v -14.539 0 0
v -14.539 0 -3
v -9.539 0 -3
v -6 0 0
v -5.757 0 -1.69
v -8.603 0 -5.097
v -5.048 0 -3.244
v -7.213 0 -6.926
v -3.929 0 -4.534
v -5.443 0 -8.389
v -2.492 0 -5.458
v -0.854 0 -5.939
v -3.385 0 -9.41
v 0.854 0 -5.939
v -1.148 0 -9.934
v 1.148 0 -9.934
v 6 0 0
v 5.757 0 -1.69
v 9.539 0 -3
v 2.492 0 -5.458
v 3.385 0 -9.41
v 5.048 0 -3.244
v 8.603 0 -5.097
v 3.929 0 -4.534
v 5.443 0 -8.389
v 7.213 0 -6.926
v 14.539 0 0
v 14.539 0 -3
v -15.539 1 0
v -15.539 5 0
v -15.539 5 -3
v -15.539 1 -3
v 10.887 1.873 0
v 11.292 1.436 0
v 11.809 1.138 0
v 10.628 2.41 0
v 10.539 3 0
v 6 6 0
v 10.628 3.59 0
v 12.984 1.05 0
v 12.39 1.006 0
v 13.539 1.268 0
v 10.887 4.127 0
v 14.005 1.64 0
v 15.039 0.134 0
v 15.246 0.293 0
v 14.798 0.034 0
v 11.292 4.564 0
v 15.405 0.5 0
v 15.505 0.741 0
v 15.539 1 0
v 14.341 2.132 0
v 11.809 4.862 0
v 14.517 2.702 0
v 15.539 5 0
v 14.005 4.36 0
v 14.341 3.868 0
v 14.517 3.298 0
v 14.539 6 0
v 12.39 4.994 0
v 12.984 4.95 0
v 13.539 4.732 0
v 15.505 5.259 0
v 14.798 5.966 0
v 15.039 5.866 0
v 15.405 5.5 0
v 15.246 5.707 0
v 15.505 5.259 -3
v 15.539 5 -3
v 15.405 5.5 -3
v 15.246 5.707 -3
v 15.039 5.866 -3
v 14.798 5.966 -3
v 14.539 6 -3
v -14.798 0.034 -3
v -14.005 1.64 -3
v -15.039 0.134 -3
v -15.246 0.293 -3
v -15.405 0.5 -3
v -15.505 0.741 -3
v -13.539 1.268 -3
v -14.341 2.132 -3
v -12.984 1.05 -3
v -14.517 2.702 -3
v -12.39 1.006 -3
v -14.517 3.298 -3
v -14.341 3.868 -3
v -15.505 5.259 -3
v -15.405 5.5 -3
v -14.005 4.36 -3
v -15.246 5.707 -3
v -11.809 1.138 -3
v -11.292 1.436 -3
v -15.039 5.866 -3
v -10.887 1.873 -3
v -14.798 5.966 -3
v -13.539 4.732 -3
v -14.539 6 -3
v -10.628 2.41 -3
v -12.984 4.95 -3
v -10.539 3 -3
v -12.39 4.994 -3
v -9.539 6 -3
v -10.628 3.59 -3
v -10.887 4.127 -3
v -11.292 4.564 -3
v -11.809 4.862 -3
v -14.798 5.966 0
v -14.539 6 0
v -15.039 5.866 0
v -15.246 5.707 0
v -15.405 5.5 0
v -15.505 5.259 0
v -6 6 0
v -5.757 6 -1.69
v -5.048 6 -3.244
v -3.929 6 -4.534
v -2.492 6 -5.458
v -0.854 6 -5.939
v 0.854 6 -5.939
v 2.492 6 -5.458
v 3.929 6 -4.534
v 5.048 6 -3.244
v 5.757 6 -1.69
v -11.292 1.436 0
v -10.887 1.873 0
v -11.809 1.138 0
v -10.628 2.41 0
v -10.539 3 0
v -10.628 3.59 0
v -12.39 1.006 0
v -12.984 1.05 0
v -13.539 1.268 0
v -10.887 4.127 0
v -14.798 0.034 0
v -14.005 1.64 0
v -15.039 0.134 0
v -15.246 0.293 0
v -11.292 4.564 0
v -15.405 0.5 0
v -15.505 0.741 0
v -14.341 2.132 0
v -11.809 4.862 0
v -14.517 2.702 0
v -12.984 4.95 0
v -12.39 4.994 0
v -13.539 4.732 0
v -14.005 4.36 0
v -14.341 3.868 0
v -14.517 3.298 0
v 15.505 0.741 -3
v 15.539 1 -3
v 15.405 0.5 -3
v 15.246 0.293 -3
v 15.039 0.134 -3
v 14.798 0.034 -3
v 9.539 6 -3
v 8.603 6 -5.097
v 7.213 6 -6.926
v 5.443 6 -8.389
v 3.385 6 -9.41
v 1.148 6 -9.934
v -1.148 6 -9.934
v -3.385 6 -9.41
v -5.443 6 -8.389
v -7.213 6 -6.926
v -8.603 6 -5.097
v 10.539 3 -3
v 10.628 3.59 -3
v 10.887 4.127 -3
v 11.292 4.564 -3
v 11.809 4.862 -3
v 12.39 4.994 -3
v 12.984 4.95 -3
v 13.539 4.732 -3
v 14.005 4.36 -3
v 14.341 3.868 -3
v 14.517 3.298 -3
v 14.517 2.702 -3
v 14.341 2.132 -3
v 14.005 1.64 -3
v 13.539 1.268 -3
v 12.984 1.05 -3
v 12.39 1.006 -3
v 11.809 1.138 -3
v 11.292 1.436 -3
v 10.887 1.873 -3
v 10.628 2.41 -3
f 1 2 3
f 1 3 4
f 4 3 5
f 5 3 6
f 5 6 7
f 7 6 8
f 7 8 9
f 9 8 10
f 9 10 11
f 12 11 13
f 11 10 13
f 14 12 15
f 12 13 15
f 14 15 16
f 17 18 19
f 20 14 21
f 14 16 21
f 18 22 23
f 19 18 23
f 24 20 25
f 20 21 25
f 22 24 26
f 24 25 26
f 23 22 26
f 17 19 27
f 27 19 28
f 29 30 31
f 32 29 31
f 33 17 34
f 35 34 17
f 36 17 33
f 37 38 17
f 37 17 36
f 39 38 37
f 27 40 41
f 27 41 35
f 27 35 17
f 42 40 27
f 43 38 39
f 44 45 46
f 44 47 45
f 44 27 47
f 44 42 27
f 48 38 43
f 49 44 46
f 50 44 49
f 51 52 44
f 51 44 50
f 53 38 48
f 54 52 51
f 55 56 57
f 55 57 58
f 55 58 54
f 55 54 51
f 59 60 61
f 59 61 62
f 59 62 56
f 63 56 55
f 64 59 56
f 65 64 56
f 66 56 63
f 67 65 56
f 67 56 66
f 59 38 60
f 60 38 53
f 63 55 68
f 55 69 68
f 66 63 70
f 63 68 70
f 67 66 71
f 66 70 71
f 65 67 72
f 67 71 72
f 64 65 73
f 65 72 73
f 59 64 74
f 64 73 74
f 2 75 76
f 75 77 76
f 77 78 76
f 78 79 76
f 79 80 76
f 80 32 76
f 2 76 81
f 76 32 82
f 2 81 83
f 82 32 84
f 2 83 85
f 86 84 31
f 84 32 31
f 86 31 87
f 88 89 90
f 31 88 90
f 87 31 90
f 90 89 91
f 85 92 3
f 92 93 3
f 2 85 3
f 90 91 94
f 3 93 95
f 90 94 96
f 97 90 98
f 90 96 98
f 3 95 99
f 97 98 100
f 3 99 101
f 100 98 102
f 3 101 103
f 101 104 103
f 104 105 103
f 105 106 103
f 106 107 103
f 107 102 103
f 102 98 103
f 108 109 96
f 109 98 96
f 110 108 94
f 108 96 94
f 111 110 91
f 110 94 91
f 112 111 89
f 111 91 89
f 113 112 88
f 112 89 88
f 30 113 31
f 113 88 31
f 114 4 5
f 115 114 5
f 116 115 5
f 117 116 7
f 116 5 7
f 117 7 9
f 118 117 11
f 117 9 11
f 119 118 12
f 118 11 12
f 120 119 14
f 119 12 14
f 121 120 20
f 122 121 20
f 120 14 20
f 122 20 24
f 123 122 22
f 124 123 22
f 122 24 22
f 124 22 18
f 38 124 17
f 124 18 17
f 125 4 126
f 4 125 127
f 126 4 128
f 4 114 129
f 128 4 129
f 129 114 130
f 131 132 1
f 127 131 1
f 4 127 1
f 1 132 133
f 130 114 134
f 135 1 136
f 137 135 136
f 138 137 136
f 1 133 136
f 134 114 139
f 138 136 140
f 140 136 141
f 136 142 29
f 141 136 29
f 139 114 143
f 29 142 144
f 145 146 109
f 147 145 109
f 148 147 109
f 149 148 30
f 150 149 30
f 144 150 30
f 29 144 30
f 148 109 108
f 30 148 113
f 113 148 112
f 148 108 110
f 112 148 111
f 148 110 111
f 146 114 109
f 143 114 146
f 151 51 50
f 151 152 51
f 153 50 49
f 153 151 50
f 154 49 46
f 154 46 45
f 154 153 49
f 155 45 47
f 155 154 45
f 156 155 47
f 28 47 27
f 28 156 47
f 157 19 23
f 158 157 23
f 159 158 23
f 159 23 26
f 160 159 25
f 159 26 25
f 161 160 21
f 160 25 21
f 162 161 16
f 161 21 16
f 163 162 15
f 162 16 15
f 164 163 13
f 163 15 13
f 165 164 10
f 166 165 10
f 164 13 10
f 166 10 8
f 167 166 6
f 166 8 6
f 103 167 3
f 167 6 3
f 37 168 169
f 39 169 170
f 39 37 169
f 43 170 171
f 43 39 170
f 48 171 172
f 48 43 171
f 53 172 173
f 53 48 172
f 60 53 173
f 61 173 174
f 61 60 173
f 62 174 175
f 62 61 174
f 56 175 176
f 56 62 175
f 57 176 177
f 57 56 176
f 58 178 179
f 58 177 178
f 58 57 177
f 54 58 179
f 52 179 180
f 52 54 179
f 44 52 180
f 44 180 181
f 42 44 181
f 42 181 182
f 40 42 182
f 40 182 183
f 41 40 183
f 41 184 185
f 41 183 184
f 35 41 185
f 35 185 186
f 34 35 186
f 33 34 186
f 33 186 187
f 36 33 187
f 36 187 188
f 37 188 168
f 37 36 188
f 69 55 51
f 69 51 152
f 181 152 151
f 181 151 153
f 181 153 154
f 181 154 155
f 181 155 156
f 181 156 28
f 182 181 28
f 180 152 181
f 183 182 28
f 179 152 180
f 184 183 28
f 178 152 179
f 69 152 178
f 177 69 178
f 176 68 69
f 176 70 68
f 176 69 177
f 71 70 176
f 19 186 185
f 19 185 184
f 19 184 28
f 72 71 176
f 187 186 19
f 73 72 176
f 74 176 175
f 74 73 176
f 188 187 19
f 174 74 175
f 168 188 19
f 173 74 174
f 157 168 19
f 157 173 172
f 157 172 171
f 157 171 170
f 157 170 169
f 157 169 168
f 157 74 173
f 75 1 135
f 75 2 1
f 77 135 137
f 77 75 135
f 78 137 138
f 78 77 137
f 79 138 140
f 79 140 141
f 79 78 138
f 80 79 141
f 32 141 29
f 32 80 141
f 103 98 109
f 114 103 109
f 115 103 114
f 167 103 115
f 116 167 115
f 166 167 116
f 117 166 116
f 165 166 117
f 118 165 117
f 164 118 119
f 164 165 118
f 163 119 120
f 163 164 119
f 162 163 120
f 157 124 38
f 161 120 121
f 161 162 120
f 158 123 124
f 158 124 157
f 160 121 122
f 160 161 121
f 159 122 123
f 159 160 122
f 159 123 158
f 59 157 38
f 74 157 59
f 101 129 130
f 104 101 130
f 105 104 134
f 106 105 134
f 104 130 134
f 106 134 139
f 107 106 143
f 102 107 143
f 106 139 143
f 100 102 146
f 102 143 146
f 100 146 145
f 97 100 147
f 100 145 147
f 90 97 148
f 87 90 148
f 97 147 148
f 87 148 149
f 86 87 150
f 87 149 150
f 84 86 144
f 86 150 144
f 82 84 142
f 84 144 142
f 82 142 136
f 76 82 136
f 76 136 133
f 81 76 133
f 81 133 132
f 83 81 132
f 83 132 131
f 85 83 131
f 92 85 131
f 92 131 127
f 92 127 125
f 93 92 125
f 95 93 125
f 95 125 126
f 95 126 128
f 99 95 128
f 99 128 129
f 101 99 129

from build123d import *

# Parameters (mm, degrees)
BOSS_EXTRUDE1_DEPTH = 6
BOSS_EXTRUDE2_DEPTH = 6
SKETCH4_R           = 2
CUT_EXTRUDE2_DEPTH  = 11
FILLET1_R           = 1


with BuildPart() as part:
    # Sketch1 → Boss-Extrude1 (new body)
    with BuildSketch(Plane(origin=(0, 0, 0), x_dir=(1, 0, 0), z_dir=(0, 1, 0))):
        with BuildLine():
            Line((-10, 0), (-6, 0))
            ThreePointArc((-6, 0), (0, 6), (6, 0))
            Line((6, 0), (10, 0))
            ThreePointArc((10, 0), (0, 10), (-10, 0))
        make_face()
    extrude(amount=BOSS_EXTRUDE1_DEPTH)

    # Sketch3 → Boss-Extrude2 (add)
    with BuildSketch(Plane(origin=(0, 6, 0), x_dir=(1, 0, 0), z_dir=(0, 1, 0))):
        with BuildLine():
            Line((-10, 0), (-15.539392014, 0))
            Line((-15.539392014, 0), (-15.539392014, 3))
            Line((-15.539392014, 3), (-9.539392014, 3))
            ThreePointArc((-9.539392014, 3), (-9.884177258, 1.517576993), (-10, 0))
        make_face()
    boss_extrude2 = extrude(amount=-BOSS_EXTRUDE2_DEPTH)

    # Sketch4 → Cut-Extrude2 (cut, through all)
    with BuildSketch(Plane.XY):
        with Locations((-12.539392014, 3)):
            Circle(SKETCH4_R)
    cut_extrude2 = extrude(amount=-CUT_EXTRUDE2_DEPTH, mode=Mode.SUBTRACT)

    # Mirror2: Boss-Extrude2, Cut-Extrude2 across plane
    add(boss_extrude2.mirror(Plane(origin=(0, 0, 0), x_dir=(0, 0, 1), z_dir=(1, 0, 0))))
    add(cut_extrude2.mirror(Plane(origin=(0, 0, 0), x_dir=(0, 0, 1), z_dir=(1, 0, 0))), mode=Mode.SUBTRACT)

    # Fillet1
    fillet1_edges = [part.edges().sort_by_distance(p)[0] for p in [
        (-15.539392014, 6, -1.5),
        (-15.539392014, 0, -1.5),
        (15.539392014, 6, -1.5),
        (15.539392014, 0, -1.5),
    ]]
    fillet(fillet1_edges, radius=FILLET1_R)


solid = part.part
